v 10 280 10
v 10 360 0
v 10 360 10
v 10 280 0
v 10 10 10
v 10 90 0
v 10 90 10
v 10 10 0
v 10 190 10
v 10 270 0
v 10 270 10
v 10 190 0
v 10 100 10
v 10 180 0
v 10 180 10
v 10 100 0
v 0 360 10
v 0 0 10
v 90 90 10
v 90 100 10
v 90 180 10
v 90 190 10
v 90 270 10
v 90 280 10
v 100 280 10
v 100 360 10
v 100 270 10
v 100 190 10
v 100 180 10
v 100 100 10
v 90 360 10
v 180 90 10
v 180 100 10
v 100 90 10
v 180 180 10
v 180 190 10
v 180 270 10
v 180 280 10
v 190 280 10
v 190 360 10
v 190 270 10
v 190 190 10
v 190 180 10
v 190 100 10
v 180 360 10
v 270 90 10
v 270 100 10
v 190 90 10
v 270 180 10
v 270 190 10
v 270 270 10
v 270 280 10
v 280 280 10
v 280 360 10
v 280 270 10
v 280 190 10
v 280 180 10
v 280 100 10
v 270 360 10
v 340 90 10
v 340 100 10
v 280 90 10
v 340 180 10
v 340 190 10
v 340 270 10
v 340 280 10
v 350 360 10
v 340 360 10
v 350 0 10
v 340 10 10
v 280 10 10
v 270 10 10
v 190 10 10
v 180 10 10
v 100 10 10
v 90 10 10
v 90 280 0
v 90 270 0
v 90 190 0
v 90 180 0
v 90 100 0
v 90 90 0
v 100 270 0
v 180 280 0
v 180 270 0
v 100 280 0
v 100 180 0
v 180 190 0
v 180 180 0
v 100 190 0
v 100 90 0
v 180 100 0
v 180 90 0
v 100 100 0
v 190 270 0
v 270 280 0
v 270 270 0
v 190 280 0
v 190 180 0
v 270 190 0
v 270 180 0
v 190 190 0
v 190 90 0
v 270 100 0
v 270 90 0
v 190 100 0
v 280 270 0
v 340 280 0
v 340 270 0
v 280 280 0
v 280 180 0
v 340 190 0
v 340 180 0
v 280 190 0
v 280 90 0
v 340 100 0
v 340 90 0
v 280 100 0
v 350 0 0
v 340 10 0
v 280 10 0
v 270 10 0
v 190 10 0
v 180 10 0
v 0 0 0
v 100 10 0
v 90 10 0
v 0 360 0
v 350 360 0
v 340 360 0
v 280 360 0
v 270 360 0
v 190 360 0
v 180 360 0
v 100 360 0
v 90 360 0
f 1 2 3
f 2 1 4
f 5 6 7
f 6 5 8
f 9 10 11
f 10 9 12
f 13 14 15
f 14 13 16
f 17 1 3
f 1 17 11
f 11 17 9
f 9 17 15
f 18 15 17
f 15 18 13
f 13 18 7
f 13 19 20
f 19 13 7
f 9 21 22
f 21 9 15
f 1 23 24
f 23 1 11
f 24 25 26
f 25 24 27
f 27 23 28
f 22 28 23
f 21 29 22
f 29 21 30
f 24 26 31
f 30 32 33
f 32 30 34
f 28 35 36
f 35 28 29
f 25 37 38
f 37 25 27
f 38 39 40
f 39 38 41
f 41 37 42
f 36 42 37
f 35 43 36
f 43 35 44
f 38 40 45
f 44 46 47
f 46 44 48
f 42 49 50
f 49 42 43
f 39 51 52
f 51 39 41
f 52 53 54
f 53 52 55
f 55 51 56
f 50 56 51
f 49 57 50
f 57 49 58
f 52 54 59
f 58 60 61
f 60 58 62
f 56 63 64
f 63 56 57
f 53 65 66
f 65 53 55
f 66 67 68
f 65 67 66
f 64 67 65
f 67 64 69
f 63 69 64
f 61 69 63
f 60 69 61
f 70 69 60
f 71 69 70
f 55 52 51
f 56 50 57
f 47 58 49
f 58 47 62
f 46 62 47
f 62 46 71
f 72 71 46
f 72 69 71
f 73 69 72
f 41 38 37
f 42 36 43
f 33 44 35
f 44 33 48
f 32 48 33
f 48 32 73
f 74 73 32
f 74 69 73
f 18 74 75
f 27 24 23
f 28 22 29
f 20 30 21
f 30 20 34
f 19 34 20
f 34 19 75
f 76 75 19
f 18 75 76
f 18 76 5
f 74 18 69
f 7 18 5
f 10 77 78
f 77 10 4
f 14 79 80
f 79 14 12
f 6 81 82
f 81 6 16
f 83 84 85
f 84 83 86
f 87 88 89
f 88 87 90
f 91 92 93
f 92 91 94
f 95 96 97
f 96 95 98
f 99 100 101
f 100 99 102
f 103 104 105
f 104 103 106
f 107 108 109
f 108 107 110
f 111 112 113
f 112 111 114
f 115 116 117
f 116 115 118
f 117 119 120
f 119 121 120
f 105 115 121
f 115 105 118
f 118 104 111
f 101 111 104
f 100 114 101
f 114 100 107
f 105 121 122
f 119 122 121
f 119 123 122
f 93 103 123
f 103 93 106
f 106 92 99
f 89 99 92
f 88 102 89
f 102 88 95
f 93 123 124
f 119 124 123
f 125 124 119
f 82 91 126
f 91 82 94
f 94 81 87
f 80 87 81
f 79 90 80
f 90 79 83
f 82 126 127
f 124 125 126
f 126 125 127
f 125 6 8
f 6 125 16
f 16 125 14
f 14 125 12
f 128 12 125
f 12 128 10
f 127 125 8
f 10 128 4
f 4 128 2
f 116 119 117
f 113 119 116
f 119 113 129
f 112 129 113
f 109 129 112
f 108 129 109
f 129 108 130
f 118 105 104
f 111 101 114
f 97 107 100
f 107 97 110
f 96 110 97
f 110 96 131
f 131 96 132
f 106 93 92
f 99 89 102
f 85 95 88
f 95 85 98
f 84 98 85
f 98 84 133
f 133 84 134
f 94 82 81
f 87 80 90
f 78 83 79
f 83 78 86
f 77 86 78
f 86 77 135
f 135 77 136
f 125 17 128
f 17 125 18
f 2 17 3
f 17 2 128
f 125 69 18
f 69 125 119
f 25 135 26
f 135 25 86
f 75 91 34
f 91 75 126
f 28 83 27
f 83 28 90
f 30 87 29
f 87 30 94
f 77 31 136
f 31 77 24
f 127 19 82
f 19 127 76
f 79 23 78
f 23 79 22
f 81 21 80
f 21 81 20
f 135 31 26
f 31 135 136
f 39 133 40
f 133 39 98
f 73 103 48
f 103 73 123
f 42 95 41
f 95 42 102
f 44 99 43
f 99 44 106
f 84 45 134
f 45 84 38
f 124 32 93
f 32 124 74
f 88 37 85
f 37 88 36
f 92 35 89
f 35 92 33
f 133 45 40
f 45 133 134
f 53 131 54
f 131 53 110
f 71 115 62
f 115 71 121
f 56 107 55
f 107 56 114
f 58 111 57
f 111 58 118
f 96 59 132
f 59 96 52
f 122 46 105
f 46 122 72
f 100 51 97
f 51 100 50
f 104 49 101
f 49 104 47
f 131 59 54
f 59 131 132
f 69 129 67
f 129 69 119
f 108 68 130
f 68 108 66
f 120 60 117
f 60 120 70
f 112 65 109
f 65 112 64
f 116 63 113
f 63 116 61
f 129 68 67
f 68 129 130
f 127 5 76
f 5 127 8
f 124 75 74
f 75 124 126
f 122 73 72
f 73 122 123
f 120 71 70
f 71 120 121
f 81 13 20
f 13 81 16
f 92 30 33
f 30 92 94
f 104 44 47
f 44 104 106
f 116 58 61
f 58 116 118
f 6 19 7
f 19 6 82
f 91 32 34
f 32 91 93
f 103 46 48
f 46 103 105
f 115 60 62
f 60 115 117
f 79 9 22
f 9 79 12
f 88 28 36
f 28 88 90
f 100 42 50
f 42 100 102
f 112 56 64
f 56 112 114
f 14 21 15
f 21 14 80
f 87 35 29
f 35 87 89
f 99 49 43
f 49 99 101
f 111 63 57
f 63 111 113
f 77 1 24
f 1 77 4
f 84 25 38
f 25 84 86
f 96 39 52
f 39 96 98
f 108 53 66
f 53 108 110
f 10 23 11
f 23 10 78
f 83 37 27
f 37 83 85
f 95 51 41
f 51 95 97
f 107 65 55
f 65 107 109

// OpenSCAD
union() {
    for (x = [0, 90, 180, 270, 340]) {
        translate([x, 0, 0])
            cube([10, 360, 10]);
    }
    for (y = [0, 90, 180, 270]) {
        translate([0, y, 0])
            cube([350, 10, 10]);
    }
}
